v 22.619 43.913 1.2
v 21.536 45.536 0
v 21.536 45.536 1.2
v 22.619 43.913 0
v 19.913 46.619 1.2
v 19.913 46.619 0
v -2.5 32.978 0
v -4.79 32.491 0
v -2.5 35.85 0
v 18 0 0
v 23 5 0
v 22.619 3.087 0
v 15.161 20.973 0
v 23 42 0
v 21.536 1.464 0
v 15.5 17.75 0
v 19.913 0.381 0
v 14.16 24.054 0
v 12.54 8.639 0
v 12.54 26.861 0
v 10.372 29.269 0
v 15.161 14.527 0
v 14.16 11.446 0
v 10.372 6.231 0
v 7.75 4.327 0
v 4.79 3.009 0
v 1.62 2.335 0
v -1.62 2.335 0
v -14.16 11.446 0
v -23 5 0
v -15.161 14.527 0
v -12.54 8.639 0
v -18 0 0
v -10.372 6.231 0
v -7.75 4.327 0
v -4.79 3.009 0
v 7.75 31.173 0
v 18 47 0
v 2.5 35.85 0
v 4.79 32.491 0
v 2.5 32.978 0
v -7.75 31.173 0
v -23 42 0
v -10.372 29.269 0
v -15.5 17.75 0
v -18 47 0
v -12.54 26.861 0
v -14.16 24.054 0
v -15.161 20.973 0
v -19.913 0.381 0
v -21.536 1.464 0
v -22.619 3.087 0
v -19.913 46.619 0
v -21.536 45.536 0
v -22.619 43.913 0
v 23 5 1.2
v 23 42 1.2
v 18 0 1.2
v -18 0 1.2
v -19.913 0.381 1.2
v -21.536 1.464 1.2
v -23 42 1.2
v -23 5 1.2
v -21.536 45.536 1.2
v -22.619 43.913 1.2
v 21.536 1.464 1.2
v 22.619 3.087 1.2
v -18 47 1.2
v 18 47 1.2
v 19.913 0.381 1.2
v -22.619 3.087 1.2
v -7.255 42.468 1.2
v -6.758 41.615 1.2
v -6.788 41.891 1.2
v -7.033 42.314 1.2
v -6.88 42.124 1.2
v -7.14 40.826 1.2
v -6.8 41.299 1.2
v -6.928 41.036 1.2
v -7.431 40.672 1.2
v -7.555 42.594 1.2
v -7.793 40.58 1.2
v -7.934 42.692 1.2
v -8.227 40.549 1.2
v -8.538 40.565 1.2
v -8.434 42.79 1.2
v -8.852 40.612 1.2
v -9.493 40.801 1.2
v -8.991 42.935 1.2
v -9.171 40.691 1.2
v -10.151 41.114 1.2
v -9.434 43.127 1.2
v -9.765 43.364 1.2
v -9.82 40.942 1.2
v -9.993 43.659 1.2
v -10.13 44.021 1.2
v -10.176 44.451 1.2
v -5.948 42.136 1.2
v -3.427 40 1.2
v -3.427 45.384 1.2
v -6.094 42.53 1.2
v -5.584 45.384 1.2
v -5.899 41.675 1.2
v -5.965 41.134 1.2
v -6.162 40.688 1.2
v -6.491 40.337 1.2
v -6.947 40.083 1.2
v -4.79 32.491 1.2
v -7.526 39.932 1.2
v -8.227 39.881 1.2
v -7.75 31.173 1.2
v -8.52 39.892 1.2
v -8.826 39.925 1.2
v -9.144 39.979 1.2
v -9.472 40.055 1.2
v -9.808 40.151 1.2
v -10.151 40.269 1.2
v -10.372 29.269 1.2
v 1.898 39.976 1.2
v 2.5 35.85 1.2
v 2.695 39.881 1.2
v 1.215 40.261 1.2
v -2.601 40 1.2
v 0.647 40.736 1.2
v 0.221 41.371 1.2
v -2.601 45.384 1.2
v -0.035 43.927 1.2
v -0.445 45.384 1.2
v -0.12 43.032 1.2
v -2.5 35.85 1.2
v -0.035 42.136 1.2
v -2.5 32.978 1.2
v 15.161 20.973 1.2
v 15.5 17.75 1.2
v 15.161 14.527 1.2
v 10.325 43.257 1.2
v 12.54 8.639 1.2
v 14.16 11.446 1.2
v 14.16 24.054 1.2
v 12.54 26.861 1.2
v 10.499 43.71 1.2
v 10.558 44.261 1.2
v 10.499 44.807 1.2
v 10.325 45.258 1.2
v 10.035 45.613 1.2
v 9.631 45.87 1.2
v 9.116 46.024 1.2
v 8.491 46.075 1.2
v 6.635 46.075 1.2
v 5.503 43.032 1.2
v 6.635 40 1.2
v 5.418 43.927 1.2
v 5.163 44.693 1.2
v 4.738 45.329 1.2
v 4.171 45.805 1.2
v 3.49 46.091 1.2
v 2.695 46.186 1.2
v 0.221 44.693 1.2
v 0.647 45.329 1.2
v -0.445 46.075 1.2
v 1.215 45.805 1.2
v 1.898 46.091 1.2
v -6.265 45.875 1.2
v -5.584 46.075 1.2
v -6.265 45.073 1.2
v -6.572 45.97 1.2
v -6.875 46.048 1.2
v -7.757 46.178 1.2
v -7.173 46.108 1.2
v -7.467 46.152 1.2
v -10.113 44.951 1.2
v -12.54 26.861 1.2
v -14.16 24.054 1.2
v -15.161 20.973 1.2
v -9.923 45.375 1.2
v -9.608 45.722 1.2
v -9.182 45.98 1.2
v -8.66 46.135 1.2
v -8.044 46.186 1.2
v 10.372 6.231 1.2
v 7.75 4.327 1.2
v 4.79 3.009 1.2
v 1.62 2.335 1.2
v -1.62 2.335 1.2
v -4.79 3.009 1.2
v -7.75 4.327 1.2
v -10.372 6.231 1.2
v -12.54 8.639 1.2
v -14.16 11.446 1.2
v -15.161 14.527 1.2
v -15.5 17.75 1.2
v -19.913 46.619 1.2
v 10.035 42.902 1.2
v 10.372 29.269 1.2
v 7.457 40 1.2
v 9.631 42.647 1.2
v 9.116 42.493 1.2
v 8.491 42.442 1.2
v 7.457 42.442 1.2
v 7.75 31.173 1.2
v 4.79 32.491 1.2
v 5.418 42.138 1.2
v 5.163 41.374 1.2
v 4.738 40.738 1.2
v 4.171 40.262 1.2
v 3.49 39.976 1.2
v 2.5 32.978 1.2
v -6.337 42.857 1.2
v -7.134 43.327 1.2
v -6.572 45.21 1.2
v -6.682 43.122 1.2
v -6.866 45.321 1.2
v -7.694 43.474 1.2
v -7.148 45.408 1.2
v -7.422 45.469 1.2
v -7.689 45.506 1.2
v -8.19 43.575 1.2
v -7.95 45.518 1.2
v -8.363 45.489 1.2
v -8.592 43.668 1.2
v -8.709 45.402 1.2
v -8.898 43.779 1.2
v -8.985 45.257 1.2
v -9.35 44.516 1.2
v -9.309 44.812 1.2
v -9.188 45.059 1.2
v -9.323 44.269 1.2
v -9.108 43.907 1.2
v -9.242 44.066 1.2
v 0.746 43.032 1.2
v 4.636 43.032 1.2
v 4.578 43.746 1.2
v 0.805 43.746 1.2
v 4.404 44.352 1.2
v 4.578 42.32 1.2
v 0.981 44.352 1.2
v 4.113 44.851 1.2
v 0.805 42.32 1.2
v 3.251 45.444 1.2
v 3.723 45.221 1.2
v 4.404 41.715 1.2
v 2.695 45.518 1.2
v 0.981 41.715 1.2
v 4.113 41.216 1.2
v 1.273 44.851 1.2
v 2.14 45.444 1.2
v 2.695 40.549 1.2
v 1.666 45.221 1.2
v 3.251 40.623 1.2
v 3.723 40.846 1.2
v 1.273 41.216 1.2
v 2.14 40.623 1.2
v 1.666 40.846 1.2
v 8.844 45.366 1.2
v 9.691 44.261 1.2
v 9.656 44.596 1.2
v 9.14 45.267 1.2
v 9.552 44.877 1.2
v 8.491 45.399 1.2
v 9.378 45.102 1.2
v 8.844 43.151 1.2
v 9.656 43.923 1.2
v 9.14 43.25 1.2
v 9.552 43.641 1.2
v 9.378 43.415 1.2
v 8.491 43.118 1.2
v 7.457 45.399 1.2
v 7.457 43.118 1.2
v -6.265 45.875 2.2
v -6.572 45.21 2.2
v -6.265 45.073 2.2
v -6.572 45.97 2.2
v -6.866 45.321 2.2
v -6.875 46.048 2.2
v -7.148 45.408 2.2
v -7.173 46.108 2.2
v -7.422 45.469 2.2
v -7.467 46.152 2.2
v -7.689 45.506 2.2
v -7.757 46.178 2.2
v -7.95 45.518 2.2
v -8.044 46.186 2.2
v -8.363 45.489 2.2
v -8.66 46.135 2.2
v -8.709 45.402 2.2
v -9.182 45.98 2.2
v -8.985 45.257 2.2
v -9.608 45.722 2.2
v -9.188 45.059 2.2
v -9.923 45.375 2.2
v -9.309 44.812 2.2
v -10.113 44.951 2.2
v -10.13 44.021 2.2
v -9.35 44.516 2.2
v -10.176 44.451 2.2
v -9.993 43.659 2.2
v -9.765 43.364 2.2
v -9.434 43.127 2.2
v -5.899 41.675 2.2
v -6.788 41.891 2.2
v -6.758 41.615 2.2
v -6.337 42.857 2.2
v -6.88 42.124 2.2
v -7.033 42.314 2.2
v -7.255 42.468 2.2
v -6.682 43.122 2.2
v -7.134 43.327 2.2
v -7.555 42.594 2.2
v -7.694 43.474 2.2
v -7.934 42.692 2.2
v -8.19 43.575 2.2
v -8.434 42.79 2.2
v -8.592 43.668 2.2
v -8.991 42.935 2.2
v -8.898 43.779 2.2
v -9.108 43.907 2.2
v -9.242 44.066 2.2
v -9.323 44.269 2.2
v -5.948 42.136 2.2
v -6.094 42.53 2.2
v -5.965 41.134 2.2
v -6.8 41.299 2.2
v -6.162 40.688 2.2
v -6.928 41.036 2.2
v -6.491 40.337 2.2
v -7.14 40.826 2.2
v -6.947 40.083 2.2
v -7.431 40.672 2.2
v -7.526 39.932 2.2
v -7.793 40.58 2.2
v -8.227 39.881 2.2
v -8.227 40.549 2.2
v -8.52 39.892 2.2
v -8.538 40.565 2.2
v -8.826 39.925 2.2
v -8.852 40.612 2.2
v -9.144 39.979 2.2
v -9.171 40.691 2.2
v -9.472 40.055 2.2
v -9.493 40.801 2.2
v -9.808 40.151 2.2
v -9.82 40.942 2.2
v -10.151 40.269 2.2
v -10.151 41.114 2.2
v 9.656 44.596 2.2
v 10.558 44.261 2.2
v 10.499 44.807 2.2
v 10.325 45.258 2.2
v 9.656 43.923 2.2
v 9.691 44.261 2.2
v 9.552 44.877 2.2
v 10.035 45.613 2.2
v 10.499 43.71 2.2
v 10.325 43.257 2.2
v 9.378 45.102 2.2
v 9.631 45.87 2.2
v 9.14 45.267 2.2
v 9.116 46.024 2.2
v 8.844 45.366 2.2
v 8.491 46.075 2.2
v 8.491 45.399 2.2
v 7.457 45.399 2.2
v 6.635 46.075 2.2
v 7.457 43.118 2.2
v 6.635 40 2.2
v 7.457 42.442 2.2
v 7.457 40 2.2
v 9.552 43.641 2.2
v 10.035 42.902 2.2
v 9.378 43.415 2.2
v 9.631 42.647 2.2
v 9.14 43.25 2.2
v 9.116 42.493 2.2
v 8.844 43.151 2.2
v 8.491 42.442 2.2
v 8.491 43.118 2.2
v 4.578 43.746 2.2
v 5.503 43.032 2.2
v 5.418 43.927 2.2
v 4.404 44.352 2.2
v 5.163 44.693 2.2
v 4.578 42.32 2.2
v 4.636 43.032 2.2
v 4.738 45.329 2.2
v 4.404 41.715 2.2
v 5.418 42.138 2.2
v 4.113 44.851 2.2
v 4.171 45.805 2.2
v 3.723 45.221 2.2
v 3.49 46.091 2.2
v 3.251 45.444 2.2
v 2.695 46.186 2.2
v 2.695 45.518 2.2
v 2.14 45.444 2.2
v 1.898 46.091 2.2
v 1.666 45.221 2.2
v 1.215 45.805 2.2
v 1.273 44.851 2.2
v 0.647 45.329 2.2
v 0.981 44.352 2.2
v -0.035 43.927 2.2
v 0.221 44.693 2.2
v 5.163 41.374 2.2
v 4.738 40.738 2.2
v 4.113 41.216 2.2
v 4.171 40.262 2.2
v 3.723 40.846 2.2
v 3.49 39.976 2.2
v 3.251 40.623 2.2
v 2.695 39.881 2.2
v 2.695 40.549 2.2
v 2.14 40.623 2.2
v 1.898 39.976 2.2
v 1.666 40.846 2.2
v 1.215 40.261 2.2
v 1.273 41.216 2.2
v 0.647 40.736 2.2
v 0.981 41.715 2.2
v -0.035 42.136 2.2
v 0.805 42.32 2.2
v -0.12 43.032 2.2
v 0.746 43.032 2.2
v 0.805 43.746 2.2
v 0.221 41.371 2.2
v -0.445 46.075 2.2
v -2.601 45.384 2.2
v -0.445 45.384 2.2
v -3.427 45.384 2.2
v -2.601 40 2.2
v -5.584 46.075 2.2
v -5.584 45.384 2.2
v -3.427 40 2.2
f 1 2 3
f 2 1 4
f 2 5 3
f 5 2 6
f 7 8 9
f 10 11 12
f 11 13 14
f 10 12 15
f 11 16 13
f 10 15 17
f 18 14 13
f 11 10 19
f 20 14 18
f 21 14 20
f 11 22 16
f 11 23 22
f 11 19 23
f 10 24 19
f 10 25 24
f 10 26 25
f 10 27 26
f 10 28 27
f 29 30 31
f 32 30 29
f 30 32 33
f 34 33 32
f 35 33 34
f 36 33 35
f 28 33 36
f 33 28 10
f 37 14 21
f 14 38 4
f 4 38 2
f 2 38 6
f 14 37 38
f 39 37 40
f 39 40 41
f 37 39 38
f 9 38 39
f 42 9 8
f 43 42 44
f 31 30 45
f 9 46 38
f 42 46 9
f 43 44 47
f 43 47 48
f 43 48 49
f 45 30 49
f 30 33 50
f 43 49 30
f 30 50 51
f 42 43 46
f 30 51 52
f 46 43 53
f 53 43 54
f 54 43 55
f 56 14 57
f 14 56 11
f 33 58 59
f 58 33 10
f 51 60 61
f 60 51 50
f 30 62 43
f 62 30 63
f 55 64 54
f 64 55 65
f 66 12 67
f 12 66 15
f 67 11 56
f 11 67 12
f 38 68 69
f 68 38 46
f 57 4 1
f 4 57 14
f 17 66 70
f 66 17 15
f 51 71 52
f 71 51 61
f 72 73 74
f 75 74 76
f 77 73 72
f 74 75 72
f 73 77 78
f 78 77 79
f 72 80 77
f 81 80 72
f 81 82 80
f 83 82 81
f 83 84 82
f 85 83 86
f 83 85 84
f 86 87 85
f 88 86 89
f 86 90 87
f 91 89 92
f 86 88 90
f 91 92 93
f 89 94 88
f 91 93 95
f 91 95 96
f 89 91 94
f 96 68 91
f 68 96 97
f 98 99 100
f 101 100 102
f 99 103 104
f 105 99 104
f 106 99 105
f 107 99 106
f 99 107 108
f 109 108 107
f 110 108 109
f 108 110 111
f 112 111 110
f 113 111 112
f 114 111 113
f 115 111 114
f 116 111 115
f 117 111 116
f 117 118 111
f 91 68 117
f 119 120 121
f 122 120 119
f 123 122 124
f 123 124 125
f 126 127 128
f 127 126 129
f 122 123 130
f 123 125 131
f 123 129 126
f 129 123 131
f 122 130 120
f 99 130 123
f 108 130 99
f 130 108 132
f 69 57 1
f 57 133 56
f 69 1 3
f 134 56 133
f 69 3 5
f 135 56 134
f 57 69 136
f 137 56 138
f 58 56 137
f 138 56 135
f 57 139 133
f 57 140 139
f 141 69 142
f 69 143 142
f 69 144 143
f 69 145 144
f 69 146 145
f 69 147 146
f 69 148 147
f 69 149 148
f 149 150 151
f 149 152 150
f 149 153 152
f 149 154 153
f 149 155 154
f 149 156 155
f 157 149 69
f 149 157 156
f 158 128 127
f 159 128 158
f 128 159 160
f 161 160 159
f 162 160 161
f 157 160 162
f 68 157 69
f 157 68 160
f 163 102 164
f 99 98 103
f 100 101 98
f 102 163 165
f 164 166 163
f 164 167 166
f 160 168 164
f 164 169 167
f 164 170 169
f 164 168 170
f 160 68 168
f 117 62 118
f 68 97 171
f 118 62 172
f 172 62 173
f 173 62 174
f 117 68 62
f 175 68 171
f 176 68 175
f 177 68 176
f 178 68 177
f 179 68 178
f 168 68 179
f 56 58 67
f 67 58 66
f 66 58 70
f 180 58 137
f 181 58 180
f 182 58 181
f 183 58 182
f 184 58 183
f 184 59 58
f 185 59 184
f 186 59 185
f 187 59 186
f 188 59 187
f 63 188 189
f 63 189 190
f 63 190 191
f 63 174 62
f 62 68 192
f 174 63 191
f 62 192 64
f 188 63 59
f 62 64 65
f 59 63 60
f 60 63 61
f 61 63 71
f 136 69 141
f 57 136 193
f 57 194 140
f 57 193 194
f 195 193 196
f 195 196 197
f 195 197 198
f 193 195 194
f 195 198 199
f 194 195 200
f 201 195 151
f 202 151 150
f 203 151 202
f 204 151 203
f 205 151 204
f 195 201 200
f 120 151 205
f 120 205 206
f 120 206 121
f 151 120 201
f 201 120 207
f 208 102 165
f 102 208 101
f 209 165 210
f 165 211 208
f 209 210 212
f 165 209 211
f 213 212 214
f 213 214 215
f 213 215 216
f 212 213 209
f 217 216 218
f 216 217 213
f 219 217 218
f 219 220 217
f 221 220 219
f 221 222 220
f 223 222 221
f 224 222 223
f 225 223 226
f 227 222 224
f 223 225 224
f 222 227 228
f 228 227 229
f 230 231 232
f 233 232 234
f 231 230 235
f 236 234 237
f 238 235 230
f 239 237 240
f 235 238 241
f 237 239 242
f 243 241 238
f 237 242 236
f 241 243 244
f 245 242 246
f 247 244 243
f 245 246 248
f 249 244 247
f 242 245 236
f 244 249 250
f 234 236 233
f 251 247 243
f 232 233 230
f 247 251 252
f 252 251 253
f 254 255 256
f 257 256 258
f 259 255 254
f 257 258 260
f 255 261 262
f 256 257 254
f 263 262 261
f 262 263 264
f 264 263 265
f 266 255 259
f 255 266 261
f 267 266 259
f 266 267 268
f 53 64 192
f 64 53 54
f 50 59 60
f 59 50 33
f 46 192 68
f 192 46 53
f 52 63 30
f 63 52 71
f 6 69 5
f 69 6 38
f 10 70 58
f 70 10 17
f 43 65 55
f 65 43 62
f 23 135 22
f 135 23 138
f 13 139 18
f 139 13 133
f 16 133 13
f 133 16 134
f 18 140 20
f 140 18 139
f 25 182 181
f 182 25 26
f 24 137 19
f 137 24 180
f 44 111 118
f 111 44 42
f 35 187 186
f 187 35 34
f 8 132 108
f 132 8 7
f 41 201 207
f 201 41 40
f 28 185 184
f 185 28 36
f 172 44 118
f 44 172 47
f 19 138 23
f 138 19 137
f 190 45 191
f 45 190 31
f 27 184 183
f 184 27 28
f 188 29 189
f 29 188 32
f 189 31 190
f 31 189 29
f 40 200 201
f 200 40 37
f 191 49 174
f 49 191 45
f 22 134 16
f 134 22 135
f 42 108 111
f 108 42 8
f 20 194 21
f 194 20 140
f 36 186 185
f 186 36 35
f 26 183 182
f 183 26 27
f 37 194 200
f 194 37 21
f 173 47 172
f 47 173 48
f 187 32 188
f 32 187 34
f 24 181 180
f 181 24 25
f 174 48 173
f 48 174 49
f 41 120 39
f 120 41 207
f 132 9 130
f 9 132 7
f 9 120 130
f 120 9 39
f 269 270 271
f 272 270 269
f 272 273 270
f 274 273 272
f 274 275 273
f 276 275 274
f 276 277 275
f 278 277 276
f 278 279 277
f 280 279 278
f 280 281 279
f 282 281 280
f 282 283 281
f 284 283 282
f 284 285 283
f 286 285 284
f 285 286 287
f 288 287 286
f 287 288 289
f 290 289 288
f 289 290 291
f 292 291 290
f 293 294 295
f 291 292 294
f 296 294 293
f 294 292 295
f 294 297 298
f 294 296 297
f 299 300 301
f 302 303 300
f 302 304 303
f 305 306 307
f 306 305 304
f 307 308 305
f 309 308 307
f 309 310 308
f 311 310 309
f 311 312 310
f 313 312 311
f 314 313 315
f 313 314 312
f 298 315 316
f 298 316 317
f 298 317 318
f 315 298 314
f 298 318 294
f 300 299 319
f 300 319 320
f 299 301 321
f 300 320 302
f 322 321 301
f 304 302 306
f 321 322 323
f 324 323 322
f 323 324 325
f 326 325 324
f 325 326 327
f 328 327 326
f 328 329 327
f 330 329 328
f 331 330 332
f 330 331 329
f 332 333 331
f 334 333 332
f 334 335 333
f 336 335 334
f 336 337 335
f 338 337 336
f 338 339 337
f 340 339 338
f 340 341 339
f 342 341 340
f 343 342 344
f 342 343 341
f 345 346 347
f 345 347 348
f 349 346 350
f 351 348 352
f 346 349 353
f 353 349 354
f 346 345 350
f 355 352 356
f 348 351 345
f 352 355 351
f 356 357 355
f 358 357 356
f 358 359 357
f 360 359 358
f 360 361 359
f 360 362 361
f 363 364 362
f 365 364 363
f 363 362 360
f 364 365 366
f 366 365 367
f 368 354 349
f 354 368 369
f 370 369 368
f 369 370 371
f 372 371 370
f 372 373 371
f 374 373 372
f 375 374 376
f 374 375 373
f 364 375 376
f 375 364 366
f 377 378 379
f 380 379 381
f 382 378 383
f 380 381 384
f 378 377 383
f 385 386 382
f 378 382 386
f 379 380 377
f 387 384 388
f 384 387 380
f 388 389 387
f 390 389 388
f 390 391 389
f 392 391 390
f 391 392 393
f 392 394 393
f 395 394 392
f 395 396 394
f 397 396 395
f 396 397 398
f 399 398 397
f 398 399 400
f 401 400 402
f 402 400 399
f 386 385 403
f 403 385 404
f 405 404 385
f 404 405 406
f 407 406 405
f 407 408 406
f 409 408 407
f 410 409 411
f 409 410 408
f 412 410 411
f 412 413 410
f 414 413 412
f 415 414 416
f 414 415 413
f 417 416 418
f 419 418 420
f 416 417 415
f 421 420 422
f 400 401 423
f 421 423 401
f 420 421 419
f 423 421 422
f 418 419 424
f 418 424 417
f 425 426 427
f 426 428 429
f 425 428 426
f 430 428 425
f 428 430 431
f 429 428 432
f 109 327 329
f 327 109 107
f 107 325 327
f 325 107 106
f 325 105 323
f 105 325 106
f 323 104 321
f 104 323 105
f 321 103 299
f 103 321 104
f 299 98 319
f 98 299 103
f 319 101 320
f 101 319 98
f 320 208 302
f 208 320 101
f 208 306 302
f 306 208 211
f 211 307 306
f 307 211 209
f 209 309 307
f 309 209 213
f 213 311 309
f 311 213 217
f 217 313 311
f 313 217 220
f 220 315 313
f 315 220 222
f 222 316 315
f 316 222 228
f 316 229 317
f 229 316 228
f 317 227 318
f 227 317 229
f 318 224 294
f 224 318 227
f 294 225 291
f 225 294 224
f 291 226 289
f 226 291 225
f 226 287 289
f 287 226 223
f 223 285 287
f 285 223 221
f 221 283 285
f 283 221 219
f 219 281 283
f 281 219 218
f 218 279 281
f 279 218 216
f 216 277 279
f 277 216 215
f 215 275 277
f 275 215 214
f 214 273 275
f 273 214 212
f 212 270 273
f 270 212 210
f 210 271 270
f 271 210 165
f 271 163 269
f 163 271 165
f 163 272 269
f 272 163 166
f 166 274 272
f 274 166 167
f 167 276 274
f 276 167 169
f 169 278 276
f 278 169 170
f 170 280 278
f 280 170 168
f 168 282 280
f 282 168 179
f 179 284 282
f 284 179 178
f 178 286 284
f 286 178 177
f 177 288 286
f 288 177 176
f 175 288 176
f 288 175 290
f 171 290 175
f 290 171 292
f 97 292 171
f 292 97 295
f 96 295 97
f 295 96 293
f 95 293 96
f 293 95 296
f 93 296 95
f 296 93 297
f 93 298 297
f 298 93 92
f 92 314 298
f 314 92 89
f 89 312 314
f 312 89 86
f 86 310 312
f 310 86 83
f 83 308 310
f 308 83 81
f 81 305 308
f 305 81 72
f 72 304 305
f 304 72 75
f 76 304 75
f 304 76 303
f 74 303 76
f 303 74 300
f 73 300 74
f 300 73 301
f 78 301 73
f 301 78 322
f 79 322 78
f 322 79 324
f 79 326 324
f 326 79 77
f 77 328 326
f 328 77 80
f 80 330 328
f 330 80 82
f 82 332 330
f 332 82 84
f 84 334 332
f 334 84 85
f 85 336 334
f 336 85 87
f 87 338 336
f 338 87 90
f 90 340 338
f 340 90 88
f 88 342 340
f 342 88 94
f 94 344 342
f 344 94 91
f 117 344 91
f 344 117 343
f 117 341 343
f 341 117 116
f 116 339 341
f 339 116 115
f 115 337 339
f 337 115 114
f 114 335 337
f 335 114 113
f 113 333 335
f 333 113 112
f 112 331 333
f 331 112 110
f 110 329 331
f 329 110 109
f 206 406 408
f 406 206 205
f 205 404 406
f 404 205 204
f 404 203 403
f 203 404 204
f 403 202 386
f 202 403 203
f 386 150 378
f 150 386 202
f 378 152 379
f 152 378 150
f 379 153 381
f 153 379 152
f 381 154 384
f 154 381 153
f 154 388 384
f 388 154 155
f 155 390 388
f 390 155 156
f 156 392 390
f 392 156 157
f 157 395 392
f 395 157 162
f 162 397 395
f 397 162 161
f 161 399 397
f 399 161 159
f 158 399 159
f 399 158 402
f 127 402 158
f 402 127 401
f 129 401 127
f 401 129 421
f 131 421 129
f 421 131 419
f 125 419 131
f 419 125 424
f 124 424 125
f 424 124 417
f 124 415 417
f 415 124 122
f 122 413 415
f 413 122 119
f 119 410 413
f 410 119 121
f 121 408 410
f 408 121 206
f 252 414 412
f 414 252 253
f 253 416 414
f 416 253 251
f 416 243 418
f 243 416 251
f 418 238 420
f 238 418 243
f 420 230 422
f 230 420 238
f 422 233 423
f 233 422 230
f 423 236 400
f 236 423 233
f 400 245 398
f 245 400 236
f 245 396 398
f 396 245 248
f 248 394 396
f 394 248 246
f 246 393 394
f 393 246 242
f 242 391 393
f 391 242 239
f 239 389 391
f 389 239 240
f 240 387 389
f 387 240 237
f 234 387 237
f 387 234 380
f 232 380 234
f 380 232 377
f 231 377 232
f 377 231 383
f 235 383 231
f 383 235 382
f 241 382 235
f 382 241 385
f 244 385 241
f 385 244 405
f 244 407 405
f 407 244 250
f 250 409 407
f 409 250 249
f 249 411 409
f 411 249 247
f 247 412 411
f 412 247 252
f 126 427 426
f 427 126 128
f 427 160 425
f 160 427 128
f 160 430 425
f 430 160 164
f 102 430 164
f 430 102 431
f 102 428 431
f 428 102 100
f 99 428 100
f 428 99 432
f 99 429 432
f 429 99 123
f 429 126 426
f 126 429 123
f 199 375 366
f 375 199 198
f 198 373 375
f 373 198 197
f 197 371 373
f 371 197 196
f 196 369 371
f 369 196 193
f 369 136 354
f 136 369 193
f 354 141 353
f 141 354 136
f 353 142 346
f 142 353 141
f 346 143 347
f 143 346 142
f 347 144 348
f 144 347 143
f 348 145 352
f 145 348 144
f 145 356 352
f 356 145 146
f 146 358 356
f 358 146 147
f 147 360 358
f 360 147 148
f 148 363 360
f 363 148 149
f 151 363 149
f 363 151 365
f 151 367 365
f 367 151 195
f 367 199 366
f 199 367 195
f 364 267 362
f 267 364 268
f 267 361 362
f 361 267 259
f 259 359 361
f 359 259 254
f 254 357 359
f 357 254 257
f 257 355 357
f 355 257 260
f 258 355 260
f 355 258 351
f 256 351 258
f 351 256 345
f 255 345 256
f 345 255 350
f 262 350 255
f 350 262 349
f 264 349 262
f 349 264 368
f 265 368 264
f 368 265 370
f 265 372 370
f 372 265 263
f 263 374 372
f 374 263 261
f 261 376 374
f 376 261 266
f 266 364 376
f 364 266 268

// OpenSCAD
LABEL = "STOP";

union(){
difference(){
translate ([-36/2,5,0])
    minkowski()
    {
        cube ([36,37,0.6]);
        cylinder (r=5,h=0.6);
    }
    
        translate([0,17.75,-0.5])    
            cylinder (r=15.5,h=4);
        translate([-2.5,30.65,-0.5])
            cube([5,5.2,4]);
}
color("DimGray"){
linear_extrude(height=2.2)translate([0,40,0])text(LABEL,font="tohoma:style=regular",halign="center",size=6);
}
}
